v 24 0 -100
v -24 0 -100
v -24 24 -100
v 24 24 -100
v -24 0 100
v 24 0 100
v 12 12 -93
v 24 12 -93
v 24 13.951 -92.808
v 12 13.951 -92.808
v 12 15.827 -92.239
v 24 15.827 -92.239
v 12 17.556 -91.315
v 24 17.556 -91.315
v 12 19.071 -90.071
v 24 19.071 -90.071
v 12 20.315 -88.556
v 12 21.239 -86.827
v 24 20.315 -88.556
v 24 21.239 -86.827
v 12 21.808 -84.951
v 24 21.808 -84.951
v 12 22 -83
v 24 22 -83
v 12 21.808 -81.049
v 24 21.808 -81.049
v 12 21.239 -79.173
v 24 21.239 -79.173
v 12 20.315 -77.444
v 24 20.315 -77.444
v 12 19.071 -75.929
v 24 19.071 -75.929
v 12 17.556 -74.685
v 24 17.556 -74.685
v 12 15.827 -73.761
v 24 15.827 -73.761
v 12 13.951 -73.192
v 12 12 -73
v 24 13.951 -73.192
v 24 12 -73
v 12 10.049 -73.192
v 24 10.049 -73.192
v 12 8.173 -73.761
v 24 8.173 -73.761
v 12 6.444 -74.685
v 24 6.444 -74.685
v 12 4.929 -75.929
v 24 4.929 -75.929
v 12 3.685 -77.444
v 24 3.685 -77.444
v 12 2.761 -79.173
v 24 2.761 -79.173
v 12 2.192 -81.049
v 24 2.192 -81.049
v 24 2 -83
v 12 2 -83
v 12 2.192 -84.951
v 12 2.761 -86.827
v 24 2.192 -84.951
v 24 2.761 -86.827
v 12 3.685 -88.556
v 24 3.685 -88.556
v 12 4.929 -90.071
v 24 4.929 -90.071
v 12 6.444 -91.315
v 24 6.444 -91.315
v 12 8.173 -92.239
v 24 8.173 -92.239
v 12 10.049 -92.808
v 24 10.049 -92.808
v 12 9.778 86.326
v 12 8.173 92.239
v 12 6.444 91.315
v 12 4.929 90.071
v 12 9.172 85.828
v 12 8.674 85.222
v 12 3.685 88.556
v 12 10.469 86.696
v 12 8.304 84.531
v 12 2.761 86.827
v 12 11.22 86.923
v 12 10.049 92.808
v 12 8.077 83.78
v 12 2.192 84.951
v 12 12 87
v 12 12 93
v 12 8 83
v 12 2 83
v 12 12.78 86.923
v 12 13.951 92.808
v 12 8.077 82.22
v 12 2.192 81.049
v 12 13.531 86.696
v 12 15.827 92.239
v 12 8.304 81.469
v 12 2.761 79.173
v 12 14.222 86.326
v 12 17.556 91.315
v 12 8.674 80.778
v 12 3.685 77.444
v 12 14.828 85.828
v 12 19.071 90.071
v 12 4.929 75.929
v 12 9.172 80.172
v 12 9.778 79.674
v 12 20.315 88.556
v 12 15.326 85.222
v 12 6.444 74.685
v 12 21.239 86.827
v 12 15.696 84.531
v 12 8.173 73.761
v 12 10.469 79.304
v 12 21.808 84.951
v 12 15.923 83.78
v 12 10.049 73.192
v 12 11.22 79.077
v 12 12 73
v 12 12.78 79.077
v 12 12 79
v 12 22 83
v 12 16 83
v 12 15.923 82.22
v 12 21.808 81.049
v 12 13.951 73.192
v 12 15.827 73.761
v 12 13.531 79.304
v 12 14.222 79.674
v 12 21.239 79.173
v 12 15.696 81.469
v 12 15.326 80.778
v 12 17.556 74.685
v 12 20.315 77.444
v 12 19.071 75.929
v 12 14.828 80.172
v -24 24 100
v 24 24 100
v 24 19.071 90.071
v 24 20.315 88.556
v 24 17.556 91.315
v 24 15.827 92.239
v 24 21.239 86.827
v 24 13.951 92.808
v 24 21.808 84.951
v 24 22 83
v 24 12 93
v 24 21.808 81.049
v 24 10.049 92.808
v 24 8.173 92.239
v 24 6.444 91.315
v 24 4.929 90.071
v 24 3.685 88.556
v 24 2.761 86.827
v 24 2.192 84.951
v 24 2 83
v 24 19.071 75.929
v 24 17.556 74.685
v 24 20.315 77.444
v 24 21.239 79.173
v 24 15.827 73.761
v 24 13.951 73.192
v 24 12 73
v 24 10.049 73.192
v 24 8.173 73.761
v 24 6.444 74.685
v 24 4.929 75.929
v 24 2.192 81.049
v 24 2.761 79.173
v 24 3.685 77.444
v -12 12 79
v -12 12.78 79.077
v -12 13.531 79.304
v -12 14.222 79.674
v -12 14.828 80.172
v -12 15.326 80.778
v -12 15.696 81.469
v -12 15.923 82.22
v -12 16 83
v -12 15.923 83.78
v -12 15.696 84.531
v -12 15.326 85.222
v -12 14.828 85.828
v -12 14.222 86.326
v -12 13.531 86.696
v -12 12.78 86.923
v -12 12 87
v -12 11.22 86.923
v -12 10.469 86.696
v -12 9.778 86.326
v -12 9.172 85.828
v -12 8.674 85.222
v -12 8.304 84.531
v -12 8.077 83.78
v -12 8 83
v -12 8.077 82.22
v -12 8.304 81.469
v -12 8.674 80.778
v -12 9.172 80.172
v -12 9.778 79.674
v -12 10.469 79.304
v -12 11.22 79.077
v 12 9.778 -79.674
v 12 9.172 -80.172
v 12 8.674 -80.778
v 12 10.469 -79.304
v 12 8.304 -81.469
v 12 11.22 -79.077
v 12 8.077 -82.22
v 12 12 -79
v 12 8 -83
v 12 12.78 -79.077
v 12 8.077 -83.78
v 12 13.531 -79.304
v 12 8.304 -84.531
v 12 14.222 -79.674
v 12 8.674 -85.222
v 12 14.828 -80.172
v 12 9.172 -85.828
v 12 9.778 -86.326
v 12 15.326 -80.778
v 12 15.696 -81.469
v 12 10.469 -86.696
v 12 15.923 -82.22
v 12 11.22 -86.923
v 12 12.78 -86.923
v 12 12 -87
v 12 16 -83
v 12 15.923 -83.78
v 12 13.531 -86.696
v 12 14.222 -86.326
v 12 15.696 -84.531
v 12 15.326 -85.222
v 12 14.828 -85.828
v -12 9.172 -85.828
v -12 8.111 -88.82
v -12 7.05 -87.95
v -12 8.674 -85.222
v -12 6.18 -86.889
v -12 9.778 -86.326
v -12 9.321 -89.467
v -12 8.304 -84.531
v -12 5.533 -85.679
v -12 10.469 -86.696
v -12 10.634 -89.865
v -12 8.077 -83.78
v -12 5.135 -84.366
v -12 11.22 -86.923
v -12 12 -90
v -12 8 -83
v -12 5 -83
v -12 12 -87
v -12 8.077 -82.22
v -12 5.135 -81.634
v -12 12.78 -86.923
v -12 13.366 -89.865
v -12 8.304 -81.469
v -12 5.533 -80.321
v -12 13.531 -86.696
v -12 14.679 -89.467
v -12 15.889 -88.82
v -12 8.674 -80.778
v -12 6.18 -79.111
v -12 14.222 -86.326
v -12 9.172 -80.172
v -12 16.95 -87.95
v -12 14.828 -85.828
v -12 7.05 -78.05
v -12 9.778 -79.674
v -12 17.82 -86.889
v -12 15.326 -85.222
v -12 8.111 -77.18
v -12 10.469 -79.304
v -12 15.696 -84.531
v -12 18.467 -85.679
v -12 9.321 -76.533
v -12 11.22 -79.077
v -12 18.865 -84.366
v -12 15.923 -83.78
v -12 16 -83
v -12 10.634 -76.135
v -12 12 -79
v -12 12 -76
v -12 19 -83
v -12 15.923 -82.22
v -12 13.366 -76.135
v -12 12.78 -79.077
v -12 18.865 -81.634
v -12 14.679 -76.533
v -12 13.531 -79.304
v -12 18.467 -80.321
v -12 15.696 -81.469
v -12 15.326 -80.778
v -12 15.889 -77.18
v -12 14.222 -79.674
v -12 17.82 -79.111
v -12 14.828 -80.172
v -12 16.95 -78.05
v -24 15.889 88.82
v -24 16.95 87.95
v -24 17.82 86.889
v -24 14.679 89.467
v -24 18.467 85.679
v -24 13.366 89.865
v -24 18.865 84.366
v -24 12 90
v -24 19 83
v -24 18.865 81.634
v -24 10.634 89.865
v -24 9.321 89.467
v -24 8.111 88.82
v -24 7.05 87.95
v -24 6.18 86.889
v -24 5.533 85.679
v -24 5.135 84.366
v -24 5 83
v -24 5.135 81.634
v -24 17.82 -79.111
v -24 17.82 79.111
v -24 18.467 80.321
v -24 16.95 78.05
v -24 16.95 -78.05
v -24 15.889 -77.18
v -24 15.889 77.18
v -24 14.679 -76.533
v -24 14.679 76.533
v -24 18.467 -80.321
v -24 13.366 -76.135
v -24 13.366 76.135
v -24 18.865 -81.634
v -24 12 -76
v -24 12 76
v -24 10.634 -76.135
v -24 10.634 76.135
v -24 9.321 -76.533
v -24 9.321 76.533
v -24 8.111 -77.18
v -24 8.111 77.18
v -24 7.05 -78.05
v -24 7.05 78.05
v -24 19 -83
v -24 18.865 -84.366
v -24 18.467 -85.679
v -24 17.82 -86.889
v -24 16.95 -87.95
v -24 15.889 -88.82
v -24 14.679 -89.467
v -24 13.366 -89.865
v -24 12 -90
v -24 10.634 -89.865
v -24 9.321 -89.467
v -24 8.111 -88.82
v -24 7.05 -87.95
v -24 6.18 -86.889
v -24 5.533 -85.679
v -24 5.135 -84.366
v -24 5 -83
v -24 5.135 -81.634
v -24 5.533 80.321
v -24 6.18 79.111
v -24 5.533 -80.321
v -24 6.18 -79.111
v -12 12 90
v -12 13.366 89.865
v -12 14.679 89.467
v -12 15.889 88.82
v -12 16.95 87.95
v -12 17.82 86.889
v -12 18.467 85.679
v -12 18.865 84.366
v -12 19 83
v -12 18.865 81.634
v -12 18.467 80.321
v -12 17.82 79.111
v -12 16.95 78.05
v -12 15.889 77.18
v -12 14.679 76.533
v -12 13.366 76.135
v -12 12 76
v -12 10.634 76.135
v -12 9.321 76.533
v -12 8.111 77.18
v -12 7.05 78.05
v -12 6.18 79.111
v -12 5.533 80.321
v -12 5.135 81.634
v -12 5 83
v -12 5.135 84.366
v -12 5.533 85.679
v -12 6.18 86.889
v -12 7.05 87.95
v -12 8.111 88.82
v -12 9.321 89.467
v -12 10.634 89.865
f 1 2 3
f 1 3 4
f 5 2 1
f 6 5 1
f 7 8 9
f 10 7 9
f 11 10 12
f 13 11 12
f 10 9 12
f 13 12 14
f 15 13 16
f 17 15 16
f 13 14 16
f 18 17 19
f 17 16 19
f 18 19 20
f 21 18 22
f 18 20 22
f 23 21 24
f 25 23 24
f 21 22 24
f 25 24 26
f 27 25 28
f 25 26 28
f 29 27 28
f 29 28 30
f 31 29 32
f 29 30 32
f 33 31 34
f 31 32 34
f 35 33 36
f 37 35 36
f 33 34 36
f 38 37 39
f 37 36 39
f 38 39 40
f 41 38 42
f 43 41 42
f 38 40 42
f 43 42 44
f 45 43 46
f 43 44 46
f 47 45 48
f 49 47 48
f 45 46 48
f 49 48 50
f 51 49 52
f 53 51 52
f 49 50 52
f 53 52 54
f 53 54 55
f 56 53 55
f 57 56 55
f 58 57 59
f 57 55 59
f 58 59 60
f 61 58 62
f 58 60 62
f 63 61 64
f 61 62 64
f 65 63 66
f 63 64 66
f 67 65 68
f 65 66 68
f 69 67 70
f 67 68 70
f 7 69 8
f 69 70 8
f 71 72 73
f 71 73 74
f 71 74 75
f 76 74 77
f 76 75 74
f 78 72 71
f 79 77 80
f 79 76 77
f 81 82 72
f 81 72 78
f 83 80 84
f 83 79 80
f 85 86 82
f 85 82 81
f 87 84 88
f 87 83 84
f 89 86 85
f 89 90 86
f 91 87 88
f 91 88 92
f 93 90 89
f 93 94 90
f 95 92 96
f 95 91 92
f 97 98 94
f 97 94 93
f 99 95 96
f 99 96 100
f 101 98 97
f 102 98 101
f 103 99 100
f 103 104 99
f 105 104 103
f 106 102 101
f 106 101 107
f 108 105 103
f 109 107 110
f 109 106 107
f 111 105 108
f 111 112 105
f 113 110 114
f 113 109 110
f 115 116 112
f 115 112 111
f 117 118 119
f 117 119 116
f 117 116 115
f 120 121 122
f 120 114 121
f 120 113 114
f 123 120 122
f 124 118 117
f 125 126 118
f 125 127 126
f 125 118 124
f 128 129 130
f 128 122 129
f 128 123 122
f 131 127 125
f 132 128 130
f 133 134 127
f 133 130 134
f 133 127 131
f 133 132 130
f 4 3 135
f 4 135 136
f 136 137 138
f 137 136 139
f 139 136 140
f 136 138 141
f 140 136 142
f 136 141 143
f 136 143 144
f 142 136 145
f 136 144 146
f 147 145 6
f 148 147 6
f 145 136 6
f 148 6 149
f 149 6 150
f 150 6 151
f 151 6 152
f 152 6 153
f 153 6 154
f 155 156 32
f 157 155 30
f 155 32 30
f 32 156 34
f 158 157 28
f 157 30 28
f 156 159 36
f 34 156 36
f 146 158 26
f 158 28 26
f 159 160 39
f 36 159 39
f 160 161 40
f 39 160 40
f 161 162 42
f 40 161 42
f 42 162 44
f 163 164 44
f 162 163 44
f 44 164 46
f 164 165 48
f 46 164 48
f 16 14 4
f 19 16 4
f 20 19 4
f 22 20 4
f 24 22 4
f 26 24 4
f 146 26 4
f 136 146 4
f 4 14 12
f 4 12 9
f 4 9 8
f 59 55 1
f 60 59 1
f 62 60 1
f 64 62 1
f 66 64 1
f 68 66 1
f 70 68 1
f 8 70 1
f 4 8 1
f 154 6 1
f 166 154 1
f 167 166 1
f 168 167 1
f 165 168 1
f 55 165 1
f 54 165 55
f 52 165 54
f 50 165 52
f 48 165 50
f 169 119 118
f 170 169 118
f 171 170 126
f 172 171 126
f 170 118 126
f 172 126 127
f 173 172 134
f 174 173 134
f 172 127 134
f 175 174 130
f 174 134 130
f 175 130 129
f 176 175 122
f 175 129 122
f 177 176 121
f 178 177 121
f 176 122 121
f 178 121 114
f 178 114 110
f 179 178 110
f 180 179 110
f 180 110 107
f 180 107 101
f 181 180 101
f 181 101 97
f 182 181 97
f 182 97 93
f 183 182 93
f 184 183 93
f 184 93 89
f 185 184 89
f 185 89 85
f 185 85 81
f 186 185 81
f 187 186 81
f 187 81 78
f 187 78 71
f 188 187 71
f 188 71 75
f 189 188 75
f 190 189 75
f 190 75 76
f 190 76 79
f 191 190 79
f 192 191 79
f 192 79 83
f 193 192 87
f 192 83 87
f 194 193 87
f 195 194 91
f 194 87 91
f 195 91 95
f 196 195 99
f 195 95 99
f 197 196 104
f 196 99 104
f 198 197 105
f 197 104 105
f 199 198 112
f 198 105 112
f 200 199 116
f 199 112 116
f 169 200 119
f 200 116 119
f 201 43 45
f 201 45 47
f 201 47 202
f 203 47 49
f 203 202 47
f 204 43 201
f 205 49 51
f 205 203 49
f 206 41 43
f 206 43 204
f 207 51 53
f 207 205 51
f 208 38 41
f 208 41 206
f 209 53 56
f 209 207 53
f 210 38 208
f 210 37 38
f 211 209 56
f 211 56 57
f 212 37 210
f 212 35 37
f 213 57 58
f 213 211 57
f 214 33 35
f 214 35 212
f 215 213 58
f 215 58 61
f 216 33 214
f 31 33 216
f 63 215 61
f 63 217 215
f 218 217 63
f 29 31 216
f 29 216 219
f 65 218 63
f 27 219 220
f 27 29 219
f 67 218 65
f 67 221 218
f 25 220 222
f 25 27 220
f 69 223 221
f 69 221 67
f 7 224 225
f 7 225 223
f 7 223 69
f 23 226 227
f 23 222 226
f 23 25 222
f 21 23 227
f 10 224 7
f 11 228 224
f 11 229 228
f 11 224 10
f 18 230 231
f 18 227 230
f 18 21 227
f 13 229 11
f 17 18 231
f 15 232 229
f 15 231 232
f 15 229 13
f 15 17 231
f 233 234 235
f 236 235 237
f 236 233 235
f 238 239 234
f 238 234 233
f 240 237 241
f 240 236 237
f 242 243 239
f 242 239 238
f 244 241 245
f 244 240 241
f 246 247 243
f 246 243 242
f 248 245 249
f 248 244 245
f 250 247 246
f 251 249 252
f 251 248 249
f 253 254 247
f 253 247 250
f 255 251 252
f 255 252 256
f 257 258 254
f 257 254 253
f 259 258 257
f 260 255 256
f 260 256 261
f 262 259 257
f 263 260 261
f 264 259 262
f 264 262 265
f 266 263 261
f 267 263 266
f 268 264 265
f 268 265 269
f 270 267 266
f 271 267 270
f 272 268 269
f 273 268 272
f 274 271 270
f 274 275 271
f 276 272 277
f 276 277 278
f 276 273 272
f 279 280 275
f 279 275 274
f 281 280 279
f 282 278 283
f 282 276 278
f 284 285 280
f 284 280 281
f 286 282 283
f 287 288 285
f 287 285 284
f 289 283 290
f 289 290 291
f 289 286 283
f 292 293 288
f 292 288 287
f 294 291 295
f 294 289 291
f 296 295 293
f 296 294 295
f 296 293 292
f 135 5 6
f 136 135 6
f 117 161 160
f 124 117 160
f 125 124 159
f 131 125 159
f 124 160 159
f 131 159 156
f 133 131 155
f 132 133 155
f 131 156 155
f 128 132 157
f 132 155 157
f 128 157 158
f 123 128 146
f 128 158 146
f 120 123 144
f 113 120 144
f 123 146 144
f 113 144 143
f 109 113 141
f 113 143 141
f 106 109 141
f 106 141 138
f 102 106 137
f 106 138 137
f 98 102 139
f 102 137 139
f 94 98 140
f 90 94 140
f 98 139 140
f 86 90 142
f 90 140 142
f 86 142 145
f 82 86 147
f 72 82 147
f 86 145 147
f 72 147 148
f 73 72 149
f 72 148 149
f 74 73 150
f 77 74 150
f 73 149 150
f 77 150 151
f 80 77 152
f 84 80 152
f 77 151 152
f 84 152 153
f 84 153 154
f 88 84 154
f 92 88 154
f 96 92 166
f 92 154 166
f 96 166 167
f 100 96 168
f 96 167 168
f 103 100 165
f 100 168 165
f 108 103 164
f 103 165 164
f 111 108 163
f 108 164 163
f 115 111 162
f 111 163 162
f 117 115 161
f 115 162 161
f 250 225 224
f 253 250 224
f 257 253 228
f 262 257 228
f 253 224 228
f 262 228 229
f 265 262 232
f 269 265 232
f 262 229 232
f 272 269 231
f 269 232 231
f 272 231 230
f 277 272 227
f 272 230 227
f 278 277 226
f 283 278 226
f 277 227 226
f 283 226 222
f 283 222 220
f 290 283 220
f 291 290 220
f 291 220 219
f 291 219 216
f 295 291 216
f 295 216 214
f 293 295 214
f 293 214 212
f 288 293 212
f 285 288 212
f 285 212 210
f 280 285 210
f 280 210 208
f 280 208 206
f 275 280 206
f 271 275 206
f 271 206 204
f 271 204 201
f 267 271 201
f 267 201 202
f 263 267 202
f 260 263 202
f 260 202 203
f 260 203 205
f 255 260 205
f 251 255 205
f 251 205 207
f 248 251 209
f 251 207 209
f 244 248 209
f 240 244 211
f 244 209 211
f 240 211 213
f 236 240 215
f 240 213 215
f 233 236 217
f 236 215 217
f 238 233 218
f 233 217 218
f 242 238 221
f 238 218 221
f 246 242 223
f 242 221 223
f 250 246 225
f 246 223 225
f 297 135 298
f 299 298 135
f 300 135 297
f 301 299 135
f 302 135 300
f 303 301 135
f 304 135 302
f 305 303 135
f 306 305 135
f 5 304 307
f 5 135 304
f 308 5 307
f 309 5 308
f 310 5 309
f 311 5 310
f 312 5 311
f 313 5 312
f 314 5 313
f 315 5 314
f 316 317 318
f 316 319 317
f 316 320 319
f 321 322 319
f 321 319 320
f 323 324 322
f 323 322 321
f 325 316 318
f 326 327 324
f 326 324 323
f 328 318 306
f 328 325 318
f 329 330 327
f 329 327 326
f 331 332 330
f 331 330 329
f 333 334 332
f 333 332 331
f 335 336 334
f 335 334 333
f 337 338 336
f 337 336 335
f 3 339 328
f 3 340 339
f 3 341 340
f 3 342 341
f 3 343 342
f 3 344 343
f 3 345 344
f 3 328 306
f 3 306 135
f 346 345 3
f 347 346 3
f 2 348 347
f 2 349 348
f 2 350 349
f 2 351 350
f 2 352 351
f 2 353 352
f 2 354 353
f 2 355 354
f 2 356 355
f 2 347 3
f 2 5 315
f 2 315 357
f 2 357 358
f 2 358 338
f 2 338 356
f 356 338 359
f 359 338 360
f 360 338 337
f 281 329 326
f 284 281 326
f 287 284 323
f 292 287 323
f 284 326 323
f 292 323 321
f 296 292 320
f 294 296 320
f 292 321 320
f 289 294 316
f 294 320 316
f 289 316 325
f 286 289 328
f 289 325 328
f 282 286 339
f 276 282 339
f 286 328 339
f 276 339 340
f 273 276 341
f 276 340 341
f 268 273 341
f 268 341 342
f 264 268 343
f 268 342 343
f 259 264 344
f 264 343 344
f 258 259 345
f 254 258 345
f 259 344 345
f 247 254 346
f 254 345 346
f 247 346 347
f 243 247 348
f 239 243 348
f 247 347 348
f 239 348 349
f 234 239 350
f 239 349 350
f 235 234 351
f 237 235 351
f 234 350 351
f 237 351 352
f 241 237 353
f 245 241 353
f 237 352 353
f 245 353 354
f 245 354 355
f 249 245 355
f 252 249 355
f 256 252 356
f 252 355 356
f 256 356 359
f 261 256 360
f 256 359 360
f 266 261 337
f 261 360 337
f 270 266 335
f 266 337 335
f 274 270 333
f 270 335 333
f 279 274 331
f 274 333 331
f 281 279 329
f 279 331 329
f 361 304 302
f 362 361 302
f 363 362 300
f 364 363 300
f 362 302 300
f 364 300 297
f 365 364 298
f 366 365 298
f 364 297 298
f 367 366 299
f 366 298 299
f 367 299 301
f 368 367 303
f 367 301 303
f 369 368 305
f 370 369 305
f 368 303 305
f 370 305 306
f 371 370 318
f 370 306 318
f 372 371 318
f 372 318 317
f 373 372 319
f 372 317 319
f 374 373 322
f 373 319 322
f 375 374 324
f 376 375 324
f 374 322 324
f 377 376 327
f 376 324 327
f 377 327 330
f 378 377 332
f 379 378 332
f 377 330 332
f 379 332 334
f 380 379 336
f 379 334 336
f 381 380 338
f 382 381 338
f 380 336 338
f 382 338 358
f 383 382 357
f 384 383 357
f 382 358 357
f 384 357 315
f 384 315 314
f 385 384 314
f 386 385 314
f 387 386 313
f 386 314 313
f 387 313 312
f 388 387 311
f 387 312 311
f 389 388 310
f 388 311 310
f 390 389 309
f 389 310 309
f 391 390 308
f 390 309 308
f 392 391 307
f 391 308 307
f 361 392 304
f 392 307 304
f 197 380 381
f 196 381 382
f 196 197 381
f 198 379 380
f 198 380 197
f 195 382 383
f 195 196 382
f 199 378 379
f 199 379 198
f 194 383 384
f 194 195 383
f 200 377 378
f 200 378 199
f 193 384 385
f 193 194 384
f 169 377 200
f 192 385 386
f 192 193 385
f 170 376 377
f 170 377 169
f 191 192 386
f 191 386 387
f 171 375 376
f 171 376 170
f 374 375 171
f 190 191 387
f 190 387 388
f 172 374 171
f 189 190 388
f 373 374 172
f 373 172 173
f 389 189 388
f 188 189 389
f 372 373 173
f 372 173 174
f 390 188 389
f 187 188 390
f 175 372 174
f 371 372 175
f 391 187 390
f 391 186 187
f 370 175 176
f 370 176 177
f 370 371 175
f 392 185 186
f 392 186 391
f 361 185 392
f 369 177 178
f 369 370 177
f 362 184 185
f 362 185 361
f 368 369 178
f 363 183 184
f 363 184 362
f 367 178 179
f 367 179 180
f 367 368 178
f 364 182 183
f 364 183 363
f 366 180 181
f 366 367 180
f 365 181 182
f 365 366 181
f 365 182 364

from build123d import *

# Parameters (mm, degrees)
ESQUISSE1_W             = 48
ESQUISSE1_H             = 200
BOSS_EXTRU_1_DEPTH      = 24
ESQUISSE2_R             = 4
ENL_V_MAT_EXTRU_1_DEPTH = 114.490087673
ESQUISSE3_R             = 10
ENL_V_MAT_EXTRU_2_DEPTH = 12
ESQUISSE4_R             = 7
ENL_V_MAT_EXTRU_3_DEPTH = 12


with BuildPart() as part:
    # Esquisse1 → Boss.-Extru.1 (new body)
    with BuildSketch(Plane(origin=(0, 0, 0), x_dir=(1, 0, 0), z_dir=(0, 1, 0))):
        Rectangle(ESQUISSE1_W, ESQUISSE1_H)
    extrude(amount=BOSS_EXTRU_1_DEPTH)

    # Esquisse2 → Enlèv. mat.-Extru.1 (cut, through all)
    with BuildSketch(Plane(origin=(24, 0, 0), x_dir=(0, 0, -1), z_dir=(1, 0, 0))):
        with Locations((-83, 12)):
            Circle(ESQUISSE2_R)
        with Locations((83, 12)):
            Circle(ESQUISSE2_R)
    extrude(amount=-ENL_V_MAT_EXTRU_1_DEPTH, mode=Mode.SUBTRACT)

    # Esquisse3 → Enlèv. mat.-Extru.2 (cut)
    with BuildSketch(Plane(origin=(24, 0, 0), x_dir=(0, 0, -1), z_dir=(1, 0, 0))):
        with Locations((-83, 12)):
            Circle(ESQUISSE3_R)
        with Locations((83, 12)):
            Circle(ESQUISSE3_R)
    extrude(amount=-ENL_V_MAT_EXTRU_2_DEPTH, mode=Mode.SUBTRACT)

    # Esquisse4 → Enlèv. mat.-Extru.3 (cut)
    with BuildSketch(Plane.ZY.offset(24)):
        with Locations((-83, 12)):
            Circle(ESQUISSE4_R)
        with Locations((83, 12)):
            Circle(ESQUISSE4_R)
    extrude(amount=-ENL_V_MAT_EXTRU_3_DEPTH, mode=Mode.SUBTRACT)


solid = part.part
